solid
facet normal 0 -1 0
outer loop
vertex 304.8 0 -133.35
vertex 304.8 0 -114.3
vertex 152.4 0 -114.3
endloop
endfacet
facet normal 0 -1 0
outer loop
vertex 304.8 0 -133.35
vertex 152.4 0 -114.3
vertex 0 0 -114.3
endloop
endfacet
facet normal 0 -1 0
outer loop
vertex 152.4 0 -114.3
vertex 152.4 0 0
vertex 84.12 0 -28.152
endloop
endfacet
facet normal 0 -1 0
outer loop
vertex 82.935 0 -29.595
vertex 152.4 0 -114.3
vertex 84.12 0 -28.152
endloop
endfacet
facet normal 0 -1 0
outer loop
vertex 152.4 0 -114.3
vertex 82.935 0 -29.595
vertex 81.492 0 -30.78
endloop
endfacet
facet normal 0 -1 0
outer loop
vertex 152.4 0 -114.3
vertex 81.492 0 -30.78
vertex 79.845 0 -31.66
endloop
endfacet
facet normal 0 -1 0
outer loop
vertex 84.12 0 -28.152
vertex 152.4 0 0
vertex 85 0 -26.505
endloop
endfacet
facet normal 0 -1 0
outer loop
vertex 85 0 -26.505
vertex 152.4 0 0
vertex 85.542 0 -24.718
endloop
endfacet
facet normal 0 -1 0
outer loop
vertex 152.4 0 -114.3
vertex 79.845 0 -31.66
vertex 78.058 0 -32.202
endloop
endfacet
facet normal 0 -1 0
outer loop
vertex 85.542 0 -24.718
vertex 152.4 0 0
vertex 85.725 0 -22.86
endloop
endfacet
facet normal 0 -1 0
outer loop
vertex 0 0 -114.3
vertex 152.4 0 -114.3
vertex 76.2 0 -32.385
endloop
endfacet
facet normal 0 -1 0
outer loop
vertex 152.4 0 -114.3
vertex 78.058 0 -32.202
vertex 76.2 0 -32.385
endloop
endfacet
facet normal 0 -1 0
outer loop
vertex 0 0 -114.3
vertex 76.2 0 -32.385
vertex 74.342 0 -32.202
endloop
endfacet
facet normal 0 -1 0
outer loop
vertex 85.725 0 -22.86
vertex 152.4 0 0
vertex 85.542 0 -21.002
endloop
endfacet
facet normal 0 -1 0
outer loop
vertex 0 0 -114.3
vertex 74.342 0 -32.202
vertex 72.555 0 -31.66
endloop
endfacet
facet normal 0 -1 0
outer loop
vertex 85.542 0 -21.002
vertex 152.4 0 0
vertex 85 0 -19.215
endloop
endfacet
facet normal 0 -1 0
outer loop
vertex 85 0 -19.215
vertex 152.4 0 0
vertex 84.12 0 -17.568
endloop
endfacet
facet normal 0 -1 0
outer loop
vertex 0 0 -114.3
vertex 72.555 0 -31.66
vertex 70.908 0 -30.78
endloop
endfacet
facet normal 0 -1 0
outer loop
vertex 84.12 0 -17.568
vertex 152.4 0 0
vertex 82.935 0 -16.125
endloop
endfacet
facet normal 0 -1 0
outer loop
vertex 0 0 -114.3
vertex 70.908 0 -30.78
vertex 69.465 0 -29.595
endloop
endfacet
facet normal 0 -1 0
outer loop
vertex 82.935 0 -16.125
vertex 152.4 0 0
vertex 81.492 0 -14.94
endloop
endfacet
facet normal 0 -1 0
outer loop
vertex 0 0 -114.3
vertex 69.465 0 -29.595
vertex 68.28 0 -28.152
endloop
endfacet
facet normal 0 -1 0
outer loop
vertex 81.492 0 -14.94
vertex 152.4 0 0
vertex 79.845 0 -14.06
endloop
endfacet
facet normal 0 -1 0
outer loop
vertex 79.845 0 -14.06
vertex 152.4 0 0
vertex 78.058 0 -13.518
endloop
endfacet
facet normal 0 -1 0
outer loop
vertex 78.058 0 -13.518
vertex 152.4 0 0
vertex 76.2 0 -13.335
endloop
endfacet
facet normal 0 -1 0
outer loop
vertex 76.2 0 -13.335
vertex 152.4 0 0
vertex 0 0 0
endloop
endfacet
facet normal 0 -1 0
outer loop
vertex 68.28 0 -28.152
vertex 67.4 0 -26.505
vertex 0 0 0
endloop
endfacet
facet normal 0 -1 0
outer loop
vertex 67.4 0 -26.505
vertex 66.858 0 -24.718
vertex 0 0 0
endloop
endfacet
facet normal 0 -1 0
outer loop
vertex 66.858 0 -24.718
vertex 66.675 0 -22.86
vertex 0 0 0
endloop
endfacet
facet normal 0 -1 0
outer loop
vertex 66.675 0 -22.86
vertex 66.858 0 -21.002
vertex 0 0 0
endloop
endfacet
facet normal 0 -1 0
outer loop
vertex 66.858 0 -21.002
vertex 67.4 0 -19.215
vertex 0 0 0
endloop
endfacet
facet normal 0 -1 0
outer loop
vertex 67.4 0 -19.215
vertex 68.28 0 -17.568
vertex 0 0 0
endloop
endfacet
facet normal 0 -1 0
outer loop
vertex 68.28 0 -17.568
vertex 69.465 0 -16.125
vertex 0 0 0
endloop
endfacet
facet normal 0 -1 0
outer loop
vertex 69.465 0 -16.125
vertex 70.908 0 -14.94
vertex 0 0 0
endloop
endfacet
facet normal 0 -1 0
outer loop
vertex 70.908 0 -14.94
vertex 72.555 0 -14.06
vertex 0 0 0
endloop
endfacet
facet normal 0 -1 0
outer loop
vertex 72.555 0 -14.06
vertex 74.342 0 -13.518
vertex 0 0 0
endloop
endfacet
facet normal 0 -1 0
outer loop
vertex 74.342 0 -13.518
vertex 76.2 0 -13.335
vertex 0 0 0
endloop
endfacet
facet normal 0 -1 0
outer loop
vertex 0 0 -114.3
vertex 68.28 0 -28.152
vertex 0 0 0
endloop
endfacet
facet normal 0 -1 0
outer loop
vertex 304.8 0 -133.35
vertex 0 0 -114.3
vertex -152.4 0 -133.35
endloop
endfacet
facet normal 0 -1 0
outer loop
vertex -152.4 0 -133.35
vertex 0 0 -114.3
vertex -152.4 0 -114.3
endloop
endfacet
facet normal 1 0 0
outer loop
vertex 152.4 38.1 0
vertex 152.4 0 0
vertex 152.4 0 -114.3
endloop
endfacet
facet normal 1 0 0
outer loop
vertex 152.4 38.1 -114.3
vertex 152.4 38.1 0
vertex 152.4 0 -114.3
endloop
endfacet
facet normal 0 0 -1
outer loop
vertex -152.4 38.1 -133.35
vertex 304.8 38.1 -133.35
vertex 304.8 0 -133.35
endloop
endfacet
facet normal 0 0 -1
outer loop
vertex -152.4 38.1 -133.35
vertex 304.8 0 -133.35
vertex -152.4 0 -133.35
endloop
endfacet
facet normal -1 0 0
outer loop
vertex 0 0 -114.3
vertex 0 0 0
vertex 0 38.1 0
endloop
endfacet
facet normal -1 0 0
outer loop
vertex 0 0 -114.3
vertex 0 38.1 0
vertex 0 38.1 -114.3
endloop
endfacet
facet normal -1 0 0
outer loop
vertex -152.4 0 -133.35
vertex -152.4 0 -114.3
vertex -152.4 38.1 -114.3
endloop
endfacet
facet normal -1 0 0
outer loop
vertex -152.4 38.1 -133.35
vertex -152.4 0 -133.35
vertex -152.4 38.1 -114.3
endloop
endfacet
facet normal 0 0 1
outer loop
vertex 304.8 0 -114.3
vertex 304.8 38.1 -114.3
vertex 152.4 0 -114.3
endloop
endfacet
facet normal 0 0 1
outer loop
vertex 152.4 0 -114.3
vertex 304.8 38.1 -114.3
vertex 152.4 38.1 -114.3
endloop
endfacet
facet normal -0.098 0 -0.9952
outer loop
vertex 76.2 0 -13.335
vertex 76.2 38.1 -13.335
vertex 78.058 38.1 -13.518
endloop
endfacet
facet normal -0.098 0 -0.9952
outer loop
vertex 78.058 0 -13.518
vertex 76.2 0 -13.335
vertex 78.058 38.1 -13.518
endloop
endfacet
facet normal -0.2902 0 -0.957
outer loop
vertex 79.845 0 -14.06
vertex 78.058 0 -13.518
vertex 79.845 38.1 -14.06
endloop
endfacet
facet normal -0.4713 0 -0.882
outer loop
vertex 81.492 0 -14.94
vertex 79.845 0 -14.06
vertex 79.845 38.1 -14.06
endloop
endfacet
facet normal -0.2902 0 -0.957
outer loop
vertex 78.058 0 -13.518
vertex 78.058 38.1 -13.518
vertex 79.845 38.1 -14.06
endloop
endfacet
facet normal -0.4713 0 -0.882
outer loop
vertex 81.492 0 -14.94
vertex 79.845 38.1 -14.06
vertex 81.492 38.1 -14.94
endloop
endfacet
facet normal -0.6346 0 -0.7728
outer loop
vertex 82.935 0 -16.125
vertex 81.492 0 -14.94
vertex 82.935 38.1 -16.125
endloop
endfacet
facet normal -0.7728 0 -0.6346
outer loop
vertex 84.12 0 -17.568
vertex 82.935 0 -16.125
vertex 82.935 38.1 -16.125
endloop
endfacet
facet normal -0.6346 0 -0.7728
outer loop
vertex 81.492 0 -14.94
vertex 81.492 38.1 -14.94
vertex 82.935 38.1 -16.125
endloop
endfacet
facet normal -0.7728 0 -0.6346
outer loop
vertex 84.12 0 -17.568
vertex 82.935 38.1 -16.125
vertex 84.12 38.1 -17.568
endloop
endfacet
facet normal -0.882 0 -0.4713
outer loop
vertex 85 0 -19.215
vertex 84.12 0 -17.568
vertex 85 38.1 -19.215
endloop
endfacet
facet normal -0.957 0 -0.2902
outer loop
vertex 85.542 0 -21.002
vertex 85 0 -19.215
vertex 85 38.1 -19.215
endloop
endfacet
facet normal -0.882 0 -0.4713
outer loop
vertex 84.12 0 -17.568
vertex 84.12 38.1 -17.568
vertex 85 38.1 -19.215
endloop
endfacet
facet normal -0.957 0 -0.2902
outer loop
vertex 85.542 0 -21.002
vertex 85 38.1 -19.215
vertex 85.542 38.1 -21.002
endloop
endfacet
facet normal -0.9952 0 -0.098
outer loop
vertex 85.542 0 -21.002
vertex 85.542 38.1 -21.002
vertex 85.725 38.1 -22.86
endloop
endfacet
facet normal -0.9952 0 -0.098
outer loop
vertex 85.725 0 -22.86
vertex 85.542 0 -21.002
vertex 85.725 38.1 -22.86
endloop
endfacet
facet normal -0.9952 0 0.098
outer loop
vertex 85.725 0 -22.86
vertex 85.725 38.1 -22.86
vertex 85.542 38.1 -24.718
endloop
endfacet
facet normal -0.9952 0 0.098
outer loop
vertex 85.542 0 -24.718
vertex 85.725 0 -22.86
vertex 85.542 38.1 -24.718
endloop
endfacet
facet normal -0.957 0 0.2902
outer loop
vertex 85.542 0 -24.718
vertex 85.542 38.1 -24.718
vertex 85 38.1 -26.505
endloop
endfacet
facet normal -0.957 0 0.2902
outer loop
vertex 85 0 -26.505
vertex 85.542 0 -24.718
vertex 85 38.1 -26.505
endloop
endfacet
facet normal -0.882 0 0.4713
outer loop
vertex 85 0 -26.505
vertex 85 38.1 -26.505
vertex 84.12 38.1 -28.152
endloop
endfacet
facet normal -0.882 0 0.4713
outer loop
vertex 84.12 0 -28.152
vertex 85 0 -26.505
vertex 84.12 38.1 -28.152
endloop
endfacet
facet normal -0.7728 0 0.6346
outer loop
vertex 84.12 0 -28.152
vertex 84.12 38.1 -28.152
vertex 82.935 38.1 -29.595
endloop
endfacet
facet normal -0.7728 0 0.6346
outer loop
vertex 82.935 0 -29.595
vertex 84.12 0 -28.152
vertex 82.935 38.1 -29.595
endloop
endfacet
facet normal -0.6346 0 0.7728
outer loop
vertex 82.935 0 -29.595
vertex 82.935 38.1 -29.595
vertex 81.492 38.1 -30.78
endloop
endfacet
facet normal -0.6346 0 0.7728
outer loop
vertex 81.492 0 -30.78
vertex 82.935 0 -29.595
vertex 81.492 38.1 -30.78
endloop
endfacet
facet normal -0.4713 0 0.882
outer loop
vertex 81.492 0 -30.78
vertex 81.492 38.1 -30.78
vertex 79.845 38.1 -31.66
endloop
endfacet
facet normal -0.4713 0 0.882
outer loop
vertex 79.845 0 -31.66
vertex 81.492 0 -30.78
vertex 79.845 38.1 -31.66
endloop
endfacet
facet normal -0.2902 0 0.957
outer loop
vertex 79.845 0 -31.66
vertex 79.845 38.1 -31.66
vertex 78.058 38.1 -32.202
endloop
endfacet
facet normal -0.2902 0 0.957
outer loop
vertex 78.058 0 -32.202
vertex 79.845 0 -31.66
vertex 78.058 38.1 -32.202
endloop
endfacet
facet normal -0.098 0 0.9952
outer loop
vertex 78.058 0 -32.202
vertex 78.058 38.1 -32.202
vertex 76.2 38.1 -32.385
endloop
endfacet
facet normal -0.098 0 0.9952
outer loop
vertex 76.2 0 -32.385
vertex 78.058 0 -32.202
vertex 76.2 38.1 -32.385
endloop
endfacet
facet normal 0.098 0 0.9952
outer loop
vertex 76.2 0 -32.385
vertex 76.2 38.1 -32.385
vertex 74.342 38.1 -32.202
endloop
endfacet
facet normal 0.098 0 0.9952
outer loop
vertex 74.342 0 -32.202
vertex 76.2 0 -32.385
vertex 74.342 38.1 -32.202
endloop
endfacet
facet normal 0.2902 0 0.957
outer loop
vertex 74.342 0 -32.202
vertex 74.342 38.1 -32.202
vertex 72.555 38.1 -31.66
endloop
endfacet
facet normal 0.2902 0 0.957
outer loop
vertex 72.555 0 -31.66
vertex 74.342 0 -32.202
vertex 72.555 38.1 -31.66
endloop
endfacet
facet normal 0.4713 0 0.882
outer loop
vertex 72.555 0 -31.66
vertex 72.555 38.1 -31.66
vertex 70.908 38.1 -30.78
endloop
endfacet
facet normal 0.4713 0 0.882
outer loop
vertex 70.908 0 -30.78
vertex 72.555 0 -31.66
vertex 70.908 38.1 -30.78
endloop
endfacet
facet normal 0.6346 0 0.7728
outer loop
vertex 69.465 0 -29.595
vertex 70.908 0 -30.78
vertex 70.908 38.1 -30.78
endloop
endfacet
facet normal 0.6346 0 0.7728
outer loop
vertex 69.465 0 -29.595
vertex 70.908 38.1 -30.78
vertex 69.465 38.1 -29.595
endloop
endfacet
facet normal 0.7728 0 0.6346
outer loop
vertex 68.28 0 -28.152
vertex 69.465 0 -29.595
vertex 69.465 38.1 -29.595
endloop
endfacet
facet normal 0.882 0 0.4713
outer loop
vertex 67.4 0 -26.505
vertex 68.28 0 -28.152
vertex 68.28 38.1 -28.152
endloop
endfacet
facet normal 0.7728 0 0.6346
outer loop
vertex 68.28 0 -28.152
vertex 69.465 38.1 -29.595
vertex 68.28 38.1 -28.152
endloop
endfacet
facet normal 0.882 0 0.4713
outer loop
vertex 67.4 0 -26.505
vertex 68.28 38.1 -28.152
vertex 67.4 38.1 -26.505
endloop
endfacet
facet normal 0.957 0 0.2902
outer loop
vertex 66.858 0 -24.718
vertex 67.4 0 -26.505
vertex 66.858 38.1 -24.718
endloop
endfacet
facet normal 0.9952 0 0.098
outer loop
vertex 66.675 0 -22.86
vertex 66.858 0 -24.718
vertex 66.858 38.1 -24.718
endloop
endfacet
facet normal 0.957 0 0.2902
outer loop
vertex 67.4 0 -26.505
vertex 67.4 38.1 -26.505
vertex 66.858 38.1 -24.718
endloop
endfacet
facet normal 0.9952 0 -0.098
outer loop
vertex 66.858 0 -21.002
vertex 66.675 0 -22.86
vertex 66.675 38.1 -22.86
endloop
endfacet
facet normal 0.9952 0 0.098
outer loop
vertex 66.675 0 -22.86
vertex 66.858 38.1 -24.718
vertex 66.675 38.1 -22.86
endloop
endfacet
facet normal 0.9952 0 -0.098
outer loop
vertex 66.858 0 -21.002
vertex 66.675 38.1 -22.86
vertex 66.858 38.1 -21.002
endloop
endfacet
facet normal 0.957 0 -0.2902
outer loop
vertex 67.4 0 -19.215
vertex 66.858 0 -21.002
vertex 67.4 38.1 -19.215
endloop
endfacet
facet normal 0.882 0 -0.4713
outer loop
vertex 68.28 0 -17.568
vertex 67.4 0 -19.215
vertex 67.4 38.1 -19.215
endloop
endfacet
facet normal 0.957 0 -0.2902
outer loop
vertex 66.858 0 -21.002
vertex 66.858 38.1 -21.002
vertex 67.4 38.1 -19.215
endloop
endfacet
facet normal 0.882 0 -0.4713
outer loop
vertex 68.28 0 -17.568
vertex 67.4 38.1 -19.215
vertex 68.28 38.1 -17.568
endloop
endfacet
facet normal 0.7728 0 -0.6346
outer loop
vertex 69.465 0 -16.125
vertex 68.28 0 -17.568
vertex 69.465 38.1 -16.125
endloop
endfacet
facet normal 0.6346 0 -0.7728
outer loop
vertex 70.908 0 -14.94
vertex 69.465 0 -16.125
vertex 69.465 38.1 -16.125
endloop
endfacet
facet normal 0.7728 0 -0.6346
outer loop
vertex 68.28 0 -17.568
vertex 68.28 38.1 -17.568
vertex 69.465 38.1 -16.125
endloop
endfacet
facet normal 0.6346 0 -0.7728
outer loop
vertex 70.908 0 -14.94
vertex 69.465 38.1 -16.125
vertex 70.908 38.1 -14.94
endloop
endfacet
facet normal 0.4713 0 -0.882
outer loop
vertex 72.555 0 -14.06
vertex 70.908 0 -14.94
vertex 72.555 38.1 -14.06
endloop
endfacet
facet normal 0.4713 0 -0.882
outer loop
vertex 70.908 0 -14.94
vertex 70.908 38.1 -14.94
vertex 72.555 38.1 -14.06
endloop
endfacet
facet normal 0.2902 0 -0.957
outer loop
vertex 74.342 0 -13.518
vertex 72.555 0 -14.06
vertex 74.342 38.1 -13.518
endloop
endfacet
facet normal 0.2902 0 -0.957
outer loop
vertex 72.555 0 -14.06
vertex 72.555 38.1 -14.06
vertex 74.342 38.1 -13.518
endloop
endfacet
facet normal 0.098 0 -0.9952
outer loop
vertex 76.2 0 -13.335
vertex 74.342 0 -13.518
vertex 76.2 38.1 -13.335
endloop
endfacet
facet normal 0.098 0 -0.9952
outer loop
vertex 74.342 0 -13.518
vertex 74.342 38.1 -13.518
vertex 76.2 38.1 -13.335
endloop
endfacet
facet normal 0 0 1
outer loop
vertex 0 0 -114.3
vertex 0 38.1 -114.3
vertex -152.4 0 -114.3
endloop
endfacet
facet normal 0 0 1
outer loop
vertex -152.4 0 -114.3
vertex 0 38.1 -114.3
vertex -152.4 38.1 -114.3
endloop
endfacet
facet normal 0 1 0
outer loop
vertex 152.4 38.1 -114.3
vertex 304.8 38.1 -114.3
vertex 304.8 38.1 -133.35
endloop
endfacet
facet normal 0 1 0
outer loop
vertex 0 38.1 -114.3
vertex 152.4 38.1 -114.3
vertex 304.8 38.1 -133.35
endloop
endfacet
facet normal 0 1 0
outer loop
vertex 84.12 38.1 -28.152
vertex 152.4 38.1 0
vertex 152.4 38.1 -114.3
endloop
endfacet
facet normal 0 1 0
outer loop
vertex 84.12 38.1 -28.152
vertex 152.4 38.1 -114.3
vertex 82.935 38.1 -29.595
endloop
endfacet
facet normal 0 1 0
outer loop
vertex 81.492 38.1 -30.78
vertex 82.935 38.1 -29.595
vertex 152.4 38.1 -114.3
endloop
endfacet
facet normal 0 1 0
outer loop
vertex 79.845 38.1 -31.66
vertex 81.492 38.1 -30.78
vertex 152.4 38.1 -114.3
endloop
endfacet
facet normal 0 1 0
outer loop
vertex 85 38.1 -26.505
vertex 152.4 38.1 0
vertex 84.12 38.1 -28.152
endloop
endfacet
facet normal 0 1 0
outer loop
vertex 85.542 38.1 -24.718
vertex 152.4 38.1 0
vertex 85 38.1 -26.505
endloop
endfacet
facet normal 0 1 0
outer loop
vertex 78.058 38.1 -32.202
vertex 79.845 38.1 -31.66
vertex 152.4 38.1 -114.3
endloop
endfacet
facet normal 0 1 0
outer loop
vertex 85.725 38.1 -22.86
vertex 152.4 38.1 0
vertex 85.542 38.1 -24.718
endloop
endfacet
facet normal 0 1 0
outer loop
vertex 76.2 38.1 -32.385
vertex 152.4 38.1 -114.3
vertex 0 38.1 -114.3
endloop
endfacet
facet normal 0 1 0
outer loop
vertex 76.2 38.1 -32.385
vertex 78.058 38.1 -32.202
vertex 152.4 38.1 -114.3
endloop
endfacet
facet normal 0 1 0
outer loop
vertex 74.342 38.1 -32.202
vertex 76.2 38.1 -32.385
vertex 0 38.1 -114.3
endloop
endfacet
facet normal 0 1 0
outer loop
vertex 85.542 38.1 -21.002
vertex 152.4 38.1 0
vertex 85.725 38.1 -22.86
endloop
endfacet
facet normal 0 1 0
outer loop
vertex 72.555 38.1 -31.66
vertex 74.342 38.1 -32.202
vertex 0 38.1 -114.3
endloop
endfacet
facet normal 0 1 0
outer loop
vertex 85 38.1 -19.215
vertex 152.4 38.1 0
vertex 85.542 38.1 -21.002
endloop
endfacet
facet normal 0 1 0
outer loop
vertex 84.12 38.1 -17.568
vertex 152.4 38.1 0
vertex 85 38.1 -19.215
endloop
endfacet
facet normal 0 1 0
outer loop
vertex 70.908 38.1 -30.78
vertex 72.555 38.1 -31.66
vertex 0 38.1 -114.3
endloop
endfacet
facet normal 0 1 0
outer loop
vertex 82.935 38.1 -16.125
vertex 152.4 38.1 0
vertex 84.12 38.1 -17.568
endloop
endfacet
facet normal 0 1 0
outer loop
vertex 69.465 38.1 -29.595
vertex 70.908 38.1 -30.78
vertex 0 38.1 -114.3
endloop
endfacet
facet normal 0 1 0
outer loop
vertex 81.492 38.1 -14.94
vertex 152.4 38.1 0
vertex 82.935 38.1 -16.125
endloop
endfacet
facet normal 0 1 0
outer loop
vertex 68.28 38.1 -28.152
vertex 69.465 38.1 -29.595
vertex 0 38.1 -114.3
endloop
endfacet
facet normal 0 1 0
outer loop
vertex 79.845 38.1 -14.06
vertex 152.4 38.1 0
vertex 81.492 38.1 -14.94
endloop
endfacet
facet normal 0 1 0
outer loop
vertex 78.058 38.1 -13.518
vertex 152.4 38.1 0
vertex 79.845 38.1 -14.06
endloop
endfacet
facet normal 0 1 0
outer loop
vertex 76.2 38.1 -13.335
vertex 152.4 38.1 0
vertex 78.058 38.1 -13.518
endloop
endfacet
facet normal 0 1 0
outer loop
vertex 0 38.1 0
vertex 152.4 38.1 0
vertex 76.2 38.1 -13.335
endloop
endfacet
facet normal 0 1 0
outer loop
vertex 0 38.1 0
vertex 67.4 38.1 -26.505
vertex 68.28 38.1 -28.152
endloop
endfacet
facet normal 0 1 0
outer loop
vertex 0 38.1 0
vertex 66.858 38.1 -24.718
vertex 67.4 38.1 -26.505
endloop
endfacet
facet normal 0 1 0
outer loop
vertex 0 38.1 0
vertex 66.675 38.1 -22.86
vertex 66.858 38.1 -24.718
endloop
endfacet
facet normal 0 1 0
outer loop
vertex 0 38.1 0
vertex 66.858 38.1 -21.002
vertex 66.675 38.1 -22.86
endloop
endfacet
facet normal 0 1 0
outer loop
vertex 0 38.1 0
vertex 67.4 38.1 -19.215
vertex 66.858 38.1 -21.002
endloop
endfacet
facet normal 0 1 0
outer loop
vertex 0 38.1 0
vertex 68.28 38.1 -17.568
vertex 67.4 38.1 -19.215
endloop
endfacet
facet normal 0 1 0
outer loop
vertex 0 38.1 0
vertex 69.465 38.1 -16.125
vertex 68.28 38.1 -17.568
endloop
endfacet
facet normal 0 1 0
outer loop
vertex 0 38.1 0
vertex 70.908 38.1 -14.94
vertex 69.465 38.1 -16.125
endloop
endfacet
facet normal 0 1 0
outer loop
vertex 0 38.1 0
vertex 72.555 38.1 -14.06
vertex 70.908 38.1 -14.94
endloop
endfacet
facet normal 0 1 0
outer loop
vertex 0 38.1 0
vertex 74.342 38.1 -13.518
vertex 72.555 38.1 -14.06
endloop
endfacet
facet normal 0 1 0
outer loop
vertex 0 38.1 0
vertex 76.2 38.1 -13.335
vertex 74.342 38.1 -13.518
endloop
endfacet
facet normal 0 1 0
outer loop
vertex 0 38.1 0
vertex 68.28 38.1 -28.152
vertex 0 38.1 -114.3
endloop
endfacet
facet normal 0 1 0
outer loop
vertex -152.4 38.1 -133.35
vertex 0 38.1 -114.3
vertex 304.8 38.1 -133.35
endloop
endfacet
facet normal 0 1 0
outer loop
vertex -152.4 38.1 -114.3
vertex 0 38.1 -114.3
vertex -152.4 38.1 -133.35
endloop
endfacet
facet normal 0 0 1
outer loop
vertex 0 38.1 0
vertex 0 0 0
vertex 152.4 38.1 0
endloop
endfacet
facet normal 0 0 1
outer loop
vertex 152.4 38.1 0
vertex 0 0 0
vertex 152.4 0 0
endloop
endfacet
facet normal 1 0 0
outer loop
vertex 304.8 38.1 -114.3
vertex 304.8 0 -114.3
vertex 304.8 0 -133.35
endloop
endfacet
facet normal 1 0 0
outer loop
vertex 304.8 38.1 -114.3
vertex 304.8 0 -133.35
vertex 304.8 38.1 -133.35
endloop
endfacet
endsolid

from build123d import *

# Parameters (mm, degrees)
SKETCH1_W                    = 152.4
SKETCH1_H                    = 114.3
BOSS_EXTRUDE1_DEPTH          = 38.1
SKETCH2_W                    = 457.2
SKETCH2_H                    = 38.1
BOSS_EXTRUDE2_DEPTH          = 19.05
F_96_0_0063_DIAMETER_HOLE1_D = 19.05


with BuildPart() as part:
    # Sketch1 → Boss-Extrude1 (new body)
    with BuildSketch(Plane(origin=(0, 0, 0), x_dir=(1, 0, 0), z_dir=(0, 1, 0))):
        with Locations((76.2, 57.15)):
            Rectangle(SKETCH1_W, SKETCH1_H)
    extrude(amount=BOSS_EXTRUDE1_DEPTH)

    # Sketch2 → Boss-Extrude2 (add)
    with BuildSketch(Plane(origin=(0, 0, -114.3), x_dir=(-1, 0, 0), z_dir=(0, 0, -1))):
        with Locations((-76.2, 19.05)):
            Rectangle(SKETCH2_W, SKETCH2_H)
    extrude(amount=BOSS_EXTRUDE2_DEPTH)

    # #96 (0.0063) Diameter Hole1 (through all)
    with Locations(Plane(origin=(76.2, 0, -22.86), x_dir=(0, 0, -1), z_dir=(0, -1, 0))):
        with Locations((0, 0)):
            Hole(F_96_0_0063_DIAMETER_HOLE1_D / 2)


solid = part.part
